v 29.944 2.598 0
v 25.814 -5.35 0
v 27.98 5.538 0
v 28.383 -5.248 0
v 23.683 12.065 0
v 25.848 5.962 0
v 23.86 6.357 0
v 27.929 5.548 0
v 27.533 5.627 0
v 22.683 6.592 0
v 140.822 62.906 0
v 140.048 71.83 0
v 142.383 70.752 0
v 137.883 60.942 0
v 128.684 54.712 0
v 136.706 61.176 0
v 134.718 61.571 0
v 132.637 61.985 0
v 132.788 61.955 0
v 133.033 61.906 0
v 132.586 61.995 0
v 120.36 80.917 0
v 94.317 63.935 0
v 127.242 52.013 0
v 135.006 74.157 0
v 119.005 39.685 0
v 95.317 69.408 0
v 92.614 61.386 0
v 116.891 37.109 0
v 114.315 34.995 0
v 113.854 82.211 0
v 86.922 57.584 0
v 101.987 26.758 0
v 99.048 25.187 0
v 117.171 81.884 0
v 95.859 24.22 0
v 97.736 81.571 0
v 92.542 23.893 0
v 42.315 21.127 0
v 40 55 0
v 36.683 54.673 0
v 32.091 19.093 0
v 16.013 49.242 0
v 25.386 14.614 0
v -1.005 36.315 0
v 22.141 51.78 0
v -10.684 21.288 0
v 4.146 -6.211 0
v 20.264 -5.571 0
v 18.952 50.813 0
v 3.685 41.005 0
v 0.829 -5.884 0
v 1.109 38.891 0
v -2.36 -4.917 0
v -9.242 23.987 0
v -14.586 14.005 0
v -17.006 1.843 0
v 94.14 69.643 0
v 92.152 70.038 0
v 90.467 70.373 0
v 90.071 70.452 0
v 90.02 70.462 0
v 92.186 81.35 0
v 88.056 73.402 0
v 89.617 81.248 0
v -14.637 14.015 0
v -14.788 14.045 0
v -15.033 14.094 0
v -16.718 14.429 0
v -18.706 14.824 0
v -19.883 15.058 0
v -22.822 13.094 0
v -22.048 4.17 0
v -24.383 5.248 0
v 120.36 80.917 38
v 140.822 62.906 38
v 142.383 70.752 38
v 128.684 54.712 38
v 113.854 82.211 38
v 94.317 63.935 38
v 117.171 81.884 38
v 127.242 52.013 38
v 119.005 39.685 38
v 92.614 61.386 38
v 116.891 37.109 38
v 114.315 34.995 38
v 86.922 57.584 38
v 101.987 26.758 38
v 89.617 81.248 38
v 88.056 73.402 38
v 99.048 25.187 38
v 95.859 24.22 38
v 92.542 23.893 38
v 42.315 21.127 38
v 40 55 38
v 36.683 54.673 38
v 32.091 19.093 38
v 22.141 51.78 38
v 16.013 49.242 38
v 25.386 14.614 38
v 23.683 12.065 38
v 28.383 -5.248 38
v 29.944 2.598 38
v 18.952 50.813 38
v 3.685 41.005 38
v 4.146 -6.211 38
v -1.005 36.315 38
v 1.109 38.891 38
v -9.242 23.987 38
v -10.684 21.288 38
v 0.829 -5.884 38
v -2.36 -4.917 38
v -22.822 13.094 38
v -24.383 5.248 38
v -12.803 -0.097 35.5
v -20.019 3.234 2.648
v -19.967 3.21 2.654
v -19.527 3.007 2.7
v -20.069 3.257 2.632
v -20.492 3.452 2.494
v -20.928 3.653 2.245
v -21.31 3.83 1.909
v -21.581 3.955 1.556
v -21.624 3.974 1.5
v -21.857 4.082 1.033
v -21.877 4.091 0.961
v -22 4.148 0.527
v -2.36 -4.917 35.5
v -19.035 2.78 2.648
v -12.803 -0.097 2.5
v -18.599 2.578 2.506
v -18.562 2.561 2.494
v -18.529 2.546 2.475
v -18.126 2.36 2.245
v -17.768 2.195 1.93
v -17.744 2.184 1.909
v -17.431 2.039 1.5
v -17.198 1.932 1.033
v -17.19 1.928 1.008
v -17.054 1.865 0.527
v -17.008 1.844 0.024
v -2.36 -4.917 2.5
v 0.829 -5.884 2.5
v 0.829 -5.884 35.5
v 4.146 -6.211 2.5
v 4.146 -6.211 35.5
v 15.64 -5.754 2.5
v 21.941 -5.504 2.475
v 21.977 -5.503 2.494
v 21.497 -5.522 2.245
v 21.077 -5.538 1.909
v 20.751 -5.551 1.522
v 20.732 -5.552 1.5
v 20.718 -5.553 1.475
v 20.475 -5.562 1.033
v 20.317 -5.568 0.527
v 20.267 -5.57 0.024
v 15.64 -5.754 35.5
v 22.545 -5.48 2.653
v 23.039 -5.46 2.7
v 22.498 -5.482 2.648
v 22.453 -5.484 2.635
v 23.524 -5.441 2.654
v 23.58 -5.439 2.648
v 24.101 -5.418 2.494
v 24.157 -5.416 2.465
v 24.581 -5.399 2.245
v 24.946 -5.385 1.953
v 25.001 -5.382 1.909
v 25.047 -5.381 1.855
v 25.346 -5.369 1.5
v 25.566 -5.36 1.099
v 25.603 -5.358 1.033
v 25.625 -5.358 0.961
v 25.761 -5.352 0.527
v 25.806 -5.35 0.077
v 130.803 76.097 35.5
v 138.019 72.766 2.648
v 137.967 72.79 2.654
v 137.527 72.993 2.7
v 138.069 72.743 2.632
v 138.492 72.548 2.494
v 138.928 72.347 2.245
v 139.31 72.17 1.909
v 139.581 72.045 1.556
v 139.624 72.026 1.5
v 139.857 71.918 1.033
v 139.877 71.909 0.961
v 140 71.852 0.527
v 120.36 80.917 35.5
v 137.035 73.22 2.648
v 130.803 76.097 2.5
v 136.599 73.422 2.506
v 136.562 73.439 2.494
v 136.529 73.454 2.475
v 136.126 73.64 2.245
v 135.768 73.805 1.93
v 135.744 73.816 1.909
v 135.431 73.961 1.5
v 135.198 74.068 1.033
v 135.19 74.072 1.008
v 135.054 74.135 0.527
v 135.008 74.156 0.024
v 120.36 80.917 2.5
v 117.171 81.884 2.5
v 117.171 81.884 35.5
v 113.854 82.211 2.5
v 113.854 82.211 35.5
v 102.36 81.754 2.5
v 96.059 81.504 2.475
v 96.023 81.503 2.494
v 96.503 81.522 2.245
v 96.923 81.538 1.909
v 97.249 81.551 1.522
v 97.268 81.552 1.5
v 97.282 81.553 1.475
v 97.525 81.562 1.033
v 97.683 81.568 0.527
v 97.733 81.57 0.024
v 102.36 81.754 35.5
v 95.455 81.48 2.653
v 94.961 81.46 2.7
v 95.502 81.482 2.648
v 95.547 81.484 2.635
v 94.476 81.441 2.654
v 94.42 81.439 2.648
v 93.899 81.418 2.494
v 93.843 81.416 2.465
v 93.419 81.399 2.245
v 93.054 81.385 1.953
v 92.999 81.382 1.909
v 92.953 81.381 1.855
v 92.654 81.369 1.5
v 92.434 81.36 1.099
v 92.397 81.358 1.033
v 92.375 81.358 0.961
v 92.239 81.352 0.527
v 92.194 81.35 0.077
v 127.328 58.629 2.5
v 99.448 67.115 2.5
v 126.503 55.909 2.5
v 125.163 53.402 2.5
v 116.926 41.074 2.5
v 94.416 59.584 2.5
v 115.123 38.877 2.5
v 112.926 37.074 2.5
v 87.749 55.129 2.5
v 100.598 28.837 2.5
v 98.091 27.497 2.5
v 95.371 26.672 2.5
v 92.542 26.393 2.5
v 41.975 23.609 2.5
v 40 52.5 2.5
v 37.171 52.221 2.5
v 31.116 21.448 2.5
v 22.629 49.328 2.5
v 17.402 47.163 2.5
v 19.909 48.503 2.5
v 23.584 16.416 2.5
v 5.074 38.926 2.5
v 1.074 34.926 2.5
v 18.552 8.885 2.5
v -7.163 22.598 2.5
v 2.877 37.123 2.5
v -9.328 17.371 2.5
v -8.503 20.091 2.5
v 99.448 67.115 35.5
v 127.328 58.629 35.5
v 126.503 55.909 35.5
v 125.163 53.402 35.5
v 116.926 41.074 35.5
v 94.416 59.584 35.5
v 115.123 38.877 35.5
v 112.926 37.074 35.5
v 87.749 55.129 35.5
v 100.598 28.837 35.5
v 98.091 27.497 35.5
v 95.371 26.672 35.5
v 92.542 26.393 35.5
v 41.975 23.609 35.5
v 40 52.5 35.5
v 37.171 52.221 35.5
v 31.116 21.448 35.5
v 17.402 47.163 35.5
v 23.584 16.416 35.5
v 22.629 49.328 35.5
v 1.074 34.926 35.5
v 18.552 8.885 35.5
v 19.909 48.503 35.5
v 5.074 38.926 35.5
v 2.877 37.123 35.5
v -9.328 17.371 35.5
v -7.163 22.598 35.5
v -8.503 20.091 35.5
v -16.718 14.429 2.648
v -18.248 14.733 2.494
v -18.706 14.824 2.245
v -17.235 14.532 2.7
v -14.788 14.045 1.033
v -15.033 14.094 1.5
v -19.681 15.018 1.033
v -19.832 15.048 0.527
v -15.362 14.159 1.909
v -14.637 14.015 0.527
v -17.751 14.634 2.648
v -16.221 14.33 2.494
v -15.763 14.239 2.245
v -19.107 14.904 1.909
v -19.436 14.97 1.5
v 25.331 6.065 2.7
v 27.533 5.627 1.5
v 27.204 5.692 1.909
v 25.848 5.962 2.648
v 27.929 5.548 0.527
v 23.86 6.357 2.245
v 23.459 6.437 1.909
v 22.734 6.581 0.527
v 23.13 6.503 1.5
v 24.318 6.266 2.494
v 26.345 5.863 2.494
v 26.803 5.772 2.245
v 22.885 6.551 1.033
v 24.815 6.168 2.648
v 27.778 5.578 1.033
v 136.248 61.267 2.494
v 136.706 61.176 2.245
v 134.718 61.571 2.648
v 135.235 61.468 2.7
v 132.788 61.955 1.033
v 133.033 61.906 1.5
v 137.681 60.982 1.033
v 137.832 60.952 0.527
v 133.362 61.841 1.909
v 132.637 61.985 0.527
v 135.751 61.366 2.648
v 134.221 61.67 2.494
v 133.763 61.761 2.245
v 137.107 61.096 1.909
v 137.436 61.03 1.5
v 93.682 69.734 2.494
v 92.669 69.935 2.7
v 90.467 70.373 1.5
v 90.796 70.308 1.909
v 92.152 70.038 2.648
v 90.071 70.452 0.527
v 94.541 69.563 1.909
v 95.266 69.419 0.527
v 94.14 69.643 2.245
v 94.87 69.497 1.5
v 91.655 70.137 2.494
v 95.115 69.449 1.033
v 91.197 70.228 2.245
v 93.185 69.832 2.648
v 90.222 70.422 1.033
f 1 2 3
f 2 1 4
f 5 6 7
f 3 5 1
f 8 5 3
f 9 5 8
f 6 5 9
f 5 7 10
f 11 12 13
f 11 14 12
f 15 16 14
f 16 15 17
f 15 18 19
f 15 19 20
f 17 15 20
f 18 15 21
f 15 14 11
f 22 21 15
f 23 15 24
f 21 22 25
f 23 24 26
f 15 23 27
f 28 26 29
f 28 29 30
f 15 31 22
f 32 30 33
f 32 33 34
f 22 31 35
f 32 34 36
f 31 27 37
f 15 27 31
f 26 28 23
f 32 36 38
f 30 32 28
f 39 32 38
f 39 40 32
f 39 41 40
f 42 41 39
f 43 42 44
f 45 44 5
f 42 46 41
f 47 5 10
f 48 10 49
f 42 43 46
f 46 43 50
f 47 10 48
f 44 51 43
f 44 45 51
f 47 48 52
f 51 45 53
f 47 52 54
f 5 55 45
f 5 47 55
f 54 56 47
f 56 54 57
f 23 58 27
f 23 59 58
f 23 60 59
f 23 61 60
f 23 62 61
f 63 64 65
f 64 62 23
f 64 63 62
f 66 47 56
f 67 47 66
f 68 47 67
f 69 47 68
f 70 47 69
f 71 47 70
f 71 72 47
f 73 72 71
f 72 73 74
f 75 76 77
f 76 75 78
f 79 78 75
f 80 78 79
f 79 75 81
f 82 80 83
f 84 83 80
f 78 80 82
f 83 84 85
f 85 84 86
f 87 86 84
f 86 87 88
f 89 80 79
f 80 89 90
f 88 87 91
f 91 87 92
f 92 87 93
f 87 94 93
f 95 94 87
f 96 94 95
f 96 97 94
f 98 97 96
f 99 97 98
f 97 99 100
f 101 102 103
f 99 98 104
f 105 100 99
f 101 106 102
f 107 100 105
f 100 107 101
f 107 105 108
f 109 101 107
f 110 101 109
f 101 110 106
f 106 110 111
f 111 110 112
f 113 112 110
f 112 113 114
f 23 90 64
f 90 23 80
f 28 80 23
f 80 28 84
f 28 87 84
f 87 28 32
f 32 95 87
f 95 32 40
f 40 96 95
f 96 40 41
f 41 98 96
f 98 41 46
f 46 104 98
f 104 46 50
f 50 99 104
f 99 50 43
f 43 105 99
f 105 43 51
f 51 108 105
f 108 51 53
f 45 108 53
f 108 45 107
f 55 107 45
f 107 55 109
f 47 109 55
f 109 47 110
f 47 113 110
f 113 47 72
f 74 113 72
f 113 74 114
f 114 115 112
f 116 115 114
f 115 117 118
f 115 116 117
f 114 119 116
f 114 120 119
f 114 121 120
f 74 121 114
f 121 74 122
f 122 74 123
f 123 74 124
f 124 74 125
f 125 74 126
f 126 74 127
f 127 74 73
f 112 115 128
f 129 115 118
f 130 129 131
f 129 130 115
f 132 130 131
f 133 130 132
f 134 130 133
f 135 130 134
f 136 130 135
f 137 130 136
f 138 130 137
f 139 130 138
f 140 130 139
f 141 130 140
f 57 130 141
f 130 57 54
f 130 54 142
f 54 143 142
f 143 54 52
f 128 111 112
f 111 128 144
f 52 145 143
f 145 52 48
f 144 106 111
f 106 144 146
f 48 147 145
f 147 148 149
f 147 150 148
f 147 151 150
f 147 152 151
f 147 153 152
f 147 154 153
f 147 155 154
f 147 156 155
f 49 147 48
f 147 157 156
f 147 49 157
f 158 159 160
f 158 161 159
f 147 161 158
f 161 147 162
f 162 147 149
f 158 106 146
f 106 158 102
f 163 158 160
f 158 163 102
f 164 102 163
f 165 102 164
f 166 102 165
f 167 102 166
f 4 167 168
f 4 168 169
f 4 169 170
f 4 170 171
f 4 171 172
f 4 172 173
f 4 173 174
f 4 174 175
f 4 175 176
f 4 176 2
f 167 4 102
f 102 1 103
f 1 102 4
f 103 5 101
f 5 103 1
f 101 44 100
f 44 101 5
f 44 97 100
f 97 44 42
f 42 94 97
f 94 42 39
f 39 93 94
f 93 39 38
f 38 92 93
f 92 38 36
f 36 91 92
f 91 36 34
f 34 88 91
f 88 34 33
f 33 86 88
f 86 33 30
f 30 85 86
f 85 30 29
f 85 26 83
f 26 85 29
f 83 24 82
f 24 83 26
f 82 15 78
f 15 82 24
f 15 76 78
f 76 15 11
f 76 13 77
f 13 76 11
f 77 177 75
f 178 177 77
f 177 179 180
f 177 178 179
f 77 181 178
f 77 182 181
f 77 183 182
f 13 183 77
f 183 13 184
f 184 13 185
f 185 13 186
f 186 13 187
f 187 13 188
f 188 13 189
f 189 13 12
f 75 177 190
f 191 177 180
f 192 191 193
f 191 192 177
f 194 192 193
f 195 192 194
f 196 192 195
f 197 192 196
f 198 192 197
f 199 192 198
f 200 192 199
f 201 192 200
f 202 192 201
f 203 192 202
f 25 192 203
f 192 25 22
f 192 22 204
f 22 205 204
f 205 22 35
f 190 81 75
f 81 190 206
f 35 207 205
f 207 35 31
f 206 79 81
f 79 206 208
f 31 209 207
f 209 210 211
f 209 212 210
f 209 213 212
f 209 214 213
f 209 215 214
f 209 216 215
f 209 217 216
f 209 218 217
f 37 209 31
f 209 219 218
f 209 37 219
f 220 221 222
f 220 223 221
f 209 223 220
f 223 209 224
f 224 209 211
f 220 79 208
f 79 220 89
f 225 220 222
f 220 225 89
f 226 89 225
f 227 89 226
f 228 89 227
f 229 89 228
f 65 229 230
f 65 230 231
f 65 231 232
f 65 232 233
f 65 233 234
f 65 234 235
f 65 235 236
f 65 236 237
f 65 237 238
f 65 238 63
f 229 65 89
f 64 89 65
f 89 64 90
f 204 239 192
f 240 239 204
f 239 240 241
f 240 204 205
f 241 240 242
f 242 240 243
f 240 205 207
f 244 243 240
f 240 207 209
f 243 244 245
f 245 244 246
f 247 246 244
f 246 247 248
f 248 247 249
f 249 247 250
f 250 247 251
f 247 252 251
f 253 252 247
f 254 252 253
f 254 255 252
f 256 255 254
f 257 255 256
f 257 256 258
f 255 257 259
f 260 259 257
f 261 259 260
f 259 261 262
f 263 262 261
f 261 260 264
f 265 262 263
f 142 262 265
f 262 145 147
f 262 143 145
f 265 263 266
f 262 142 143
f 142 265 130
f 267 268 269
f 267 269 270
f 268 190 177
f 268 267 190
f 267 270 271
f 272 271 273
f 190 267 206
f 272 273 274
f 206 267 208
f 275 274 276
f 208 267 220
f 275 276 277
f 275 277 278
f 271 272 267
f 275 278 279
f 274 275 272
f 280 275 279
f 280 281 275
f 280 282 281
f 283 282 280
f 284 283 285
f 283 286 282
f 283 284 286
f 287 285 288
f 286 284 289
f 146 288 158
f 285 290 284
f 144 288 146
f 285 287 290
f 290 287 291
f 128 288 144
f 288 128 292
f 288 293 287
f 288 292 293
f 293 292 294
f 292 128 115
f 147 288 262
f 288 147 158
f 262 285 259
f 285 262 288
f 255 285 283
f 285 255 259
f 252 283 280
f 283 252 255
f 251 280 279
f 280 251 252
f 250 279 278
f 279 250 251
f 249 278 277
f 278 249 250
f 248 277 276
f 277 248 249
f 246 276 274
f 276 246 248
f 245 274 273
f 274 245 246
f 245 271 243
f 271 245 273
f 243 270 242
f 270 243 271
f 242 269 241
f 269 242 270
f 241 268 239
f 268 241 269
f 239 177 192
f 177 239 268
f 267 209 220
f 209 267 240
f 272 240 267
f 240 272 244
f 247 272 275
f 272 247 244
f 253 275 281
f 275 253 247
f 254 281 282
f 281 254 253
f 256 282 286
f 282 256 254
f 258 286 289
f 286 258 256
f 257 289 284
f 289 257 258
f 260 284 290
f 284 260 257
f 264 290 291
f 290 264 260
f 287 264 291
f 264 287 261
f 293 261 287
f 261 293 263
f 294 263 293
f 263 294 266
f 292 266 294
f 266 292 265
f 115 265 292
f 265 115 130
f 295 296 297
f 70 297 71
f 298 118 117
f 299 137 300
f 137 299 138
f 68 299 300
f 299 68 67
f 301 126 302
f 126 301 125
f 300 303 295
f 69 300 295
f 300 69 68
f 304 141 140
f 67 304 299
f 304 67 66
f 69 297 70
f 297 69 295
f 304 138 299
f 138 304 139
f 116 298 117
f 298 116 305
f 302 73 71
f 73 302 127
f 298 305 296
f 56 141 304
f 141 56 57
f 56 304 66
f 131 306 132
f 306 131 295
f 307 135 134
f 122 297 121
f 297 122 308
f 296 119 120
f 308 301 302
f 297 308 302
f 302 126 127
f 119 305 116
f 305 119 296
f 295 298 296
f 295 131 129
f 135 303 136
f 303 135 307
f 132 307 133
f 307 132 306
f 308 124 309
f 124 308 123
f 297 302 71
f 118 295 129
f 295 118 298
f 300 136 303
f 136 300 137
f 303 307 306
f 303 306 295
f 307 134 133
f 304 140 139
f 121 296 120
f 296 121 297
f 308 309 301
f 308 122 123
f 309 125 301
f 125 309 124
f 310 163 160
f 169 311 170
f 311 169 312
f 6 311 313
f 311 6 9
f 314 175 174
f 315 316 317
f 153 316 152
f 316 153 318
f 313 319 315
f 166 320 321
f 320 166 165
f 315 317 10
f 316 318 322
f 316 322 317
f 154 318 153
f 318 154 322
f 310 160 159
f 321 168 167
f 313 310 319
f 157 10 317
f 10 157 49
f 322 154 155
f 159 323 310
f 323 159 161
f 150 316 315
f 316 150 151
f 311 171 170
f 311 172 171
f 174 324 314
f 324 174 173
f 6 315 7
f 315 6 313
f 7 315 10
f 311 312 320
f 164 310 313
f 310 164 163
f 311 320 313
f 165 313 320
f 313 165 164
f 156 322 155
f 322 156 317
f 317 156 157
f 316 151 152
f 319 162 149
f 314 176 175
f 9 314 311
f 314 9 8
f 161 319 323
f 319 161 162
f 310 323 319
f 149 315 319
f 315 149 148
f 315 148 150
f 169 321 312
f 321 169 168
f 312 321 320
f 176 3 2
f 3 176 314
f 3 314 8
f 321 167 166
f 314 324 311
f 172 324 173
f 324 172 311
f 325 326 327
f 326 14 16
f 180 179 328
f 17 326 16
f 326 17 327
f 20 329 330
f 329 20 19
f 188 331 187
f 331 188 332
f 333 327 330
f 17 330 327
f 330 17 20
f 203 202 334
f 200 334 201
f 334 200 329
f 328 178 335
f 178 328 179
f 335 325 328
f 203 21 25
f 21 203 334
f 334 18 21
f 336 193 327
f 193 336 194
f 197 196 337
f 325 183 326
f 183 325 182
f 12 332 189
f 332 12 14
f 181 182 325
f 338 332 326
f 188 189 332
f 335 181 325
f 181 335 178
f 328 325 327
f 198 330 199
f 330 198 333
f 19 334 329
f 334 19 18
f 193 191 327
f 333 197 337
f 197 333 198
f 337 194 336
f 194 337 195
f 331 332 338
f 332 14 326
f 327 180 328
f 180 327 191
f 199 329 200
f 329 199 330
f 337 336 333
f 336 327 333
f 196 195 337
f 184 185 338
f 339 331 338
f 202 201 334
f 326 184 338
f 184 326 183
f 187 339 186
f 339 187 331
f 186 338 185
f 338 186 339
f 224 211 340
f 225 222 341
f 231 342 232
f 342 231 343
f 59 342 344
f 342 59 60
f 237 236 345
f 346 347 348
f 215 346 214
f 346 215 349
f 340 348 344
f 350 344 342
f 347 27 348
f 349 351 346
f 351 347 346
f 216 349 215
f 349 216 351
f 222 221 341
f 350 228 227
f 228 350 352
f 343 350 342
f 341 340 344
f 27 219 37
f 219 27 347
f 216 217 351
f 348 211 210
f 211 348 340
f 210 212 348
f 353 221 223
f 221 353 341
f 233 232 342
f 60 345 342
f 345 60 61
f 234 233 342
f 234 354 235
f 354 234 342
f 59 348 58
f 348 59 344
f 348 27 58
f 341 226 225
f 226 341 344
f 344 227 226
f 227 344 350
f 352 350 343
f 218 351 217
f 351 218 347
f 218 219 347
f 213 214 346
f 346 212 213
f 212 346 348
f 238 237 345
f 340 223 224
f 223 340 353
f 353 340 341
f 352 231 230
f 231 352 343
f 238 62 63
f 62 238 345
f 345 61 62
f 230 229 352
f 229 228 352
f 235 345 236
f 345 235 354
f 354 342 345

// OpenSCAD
$fn = 32;

// ----------------------------------------------------------------------
// Air duct: 34 mm duct, 2.5 mm wall, 38 mm across
// ----------------------------------------------------------------------

// --- parameters (mm) ---
duct_r = 17;              // duct core radius
duct_d = 34;              // duct core diameter
wall = 2.5;               // duct wall thickness
height = 38;              // duct width (extrusion height)
port_r = 26.9;            // port flange half width
port_d = 53.8;            // port flange width
port_t = 8;               // port flange thickness
bolt_d = 5.4;             // port bolt holes
bolt_offset = 21.7;       // bolt hole offset from the port axis

difference() {
  /* outer hull chain: tube with a flat flange plate at every port */
  linear_extrude(height = 38) {
    hull() {
      polygon([[28.383, -5.248], [-24.383, 5.248], [-22.822, 13.094], [29.944, 2.598]]);
      translate([4.146, 10.789]) circle(r = 17);
    }
    hull() {
      translate([4.146, 10.789]) circle(r = 17);
      translate([4.893, 14.542]) circle(r = 17);
    }
    hull() {
      translate([4.893, 14.542]) circle(r = 17);
      translate([13.13, 26.87]) circle(r = 17);
    }
    hull() {
      translate([13.13, 26.87]) circle(r = 17);
      translate([25.458, 35.107]) circle(r = 17);
    }
    hull() {
      translate([25.458, 35.107]) circle(r = 17);
      translate([40, 38]) circle(r = 17);
    }
    hull() {
      translate([40, 38]) circle(r = 17);
      translate([92.542, 40.893]) circle(r = 17);
    }
    hull() {
      translate([92.542, 40.893]) circle(r = 17);
      translate([104.87, 49.13]) circle(r = 17);
    }
    hull() {
      translate([104.87, 49.13]) circle(r = 17);
      translate([113.107, 61.458]) circle(r = 17);
    }
    hull() {
      translate([113.107, 61.458]) circle(r = 17);
      translate([113.854, 65.211]) circle(r = 17);
    }
    hull() {
      translate([113.854, 65.211]) circle(r = 17);
      polygon([[89.617, 81.248], [142.383, 70.752], [140.822, 62.906], [88.056, 73.402]]);
    }
  }
  /* air passage: the same chain inset by the wall, 5 mm proud of the ports */
  translate([0, 0, 2.5]) linear_extrude(height = 33) {
    hull() {
      translate([1.025, -4.904]) circle(r = 14.5);
      translate([4.893, 14.542]) circle(r = 14.5);
    }
    hull() {
      translate([4.893, 14.542]) circle(r = 14.5);
      translate([13.13, 26.87]) circle(r = 14.5);
    }
    hull() {
      translate([13.13, 26.87]) circle(r = 14.5);
      translate([25.458, 35.107]) circle(r = 14.5);
    }
    hull() {
      translate([25.458, 35.107]) circle(r = 14.5);
      translate([40, 38]) circle(r = 14.5);
    }
    hull() {
      translate([40, 38]) circle(r = 14.5);
      translate([92.542, 40.893]) circle(r = 14.5);
    }
    hull() {
      translate([92.542, 40.893]) circle(r = 14.5);
      translate([104.87, 49.13]) circle(r = 14.5);
    }
    hull() {
      translate([104.87, 49.13]) circle(r = 14.5);
      translate([113.107, 61.458]) circle(r = 14.5);
    }
    hull() {
      translate([113.107, 61.458]) circle(r = 14.5);
      translate([116.975, 80.904]) circle(r = 14.5);
    }
  }
  translate([2, 0]) rotate([0, 0, -11.25]) translate([-21.7, -2.5]) rotate([-90, 0, 0]) cylinder(h = 13, d = 5.4);
  translate([2, 0]) rotate([0, 0, -11.25]) translate([21.7, -2.5]) rotate([-90, 0, 0]) cylinder(h = 13, d = 5.4);
  translate([116, 76]) rotate([0, 0, 168.75]) translate([-21.7, -2.5]) rotate([-90, 0, 0]) cylinder(h = 13, d = 5.4);
  translate([116, 76]) rotate([0, 0, 168.75]) translate([21.7, -2.5]) rotate([-90, 0, 0]) cylinder(h = 13, d = 5.4);
}
